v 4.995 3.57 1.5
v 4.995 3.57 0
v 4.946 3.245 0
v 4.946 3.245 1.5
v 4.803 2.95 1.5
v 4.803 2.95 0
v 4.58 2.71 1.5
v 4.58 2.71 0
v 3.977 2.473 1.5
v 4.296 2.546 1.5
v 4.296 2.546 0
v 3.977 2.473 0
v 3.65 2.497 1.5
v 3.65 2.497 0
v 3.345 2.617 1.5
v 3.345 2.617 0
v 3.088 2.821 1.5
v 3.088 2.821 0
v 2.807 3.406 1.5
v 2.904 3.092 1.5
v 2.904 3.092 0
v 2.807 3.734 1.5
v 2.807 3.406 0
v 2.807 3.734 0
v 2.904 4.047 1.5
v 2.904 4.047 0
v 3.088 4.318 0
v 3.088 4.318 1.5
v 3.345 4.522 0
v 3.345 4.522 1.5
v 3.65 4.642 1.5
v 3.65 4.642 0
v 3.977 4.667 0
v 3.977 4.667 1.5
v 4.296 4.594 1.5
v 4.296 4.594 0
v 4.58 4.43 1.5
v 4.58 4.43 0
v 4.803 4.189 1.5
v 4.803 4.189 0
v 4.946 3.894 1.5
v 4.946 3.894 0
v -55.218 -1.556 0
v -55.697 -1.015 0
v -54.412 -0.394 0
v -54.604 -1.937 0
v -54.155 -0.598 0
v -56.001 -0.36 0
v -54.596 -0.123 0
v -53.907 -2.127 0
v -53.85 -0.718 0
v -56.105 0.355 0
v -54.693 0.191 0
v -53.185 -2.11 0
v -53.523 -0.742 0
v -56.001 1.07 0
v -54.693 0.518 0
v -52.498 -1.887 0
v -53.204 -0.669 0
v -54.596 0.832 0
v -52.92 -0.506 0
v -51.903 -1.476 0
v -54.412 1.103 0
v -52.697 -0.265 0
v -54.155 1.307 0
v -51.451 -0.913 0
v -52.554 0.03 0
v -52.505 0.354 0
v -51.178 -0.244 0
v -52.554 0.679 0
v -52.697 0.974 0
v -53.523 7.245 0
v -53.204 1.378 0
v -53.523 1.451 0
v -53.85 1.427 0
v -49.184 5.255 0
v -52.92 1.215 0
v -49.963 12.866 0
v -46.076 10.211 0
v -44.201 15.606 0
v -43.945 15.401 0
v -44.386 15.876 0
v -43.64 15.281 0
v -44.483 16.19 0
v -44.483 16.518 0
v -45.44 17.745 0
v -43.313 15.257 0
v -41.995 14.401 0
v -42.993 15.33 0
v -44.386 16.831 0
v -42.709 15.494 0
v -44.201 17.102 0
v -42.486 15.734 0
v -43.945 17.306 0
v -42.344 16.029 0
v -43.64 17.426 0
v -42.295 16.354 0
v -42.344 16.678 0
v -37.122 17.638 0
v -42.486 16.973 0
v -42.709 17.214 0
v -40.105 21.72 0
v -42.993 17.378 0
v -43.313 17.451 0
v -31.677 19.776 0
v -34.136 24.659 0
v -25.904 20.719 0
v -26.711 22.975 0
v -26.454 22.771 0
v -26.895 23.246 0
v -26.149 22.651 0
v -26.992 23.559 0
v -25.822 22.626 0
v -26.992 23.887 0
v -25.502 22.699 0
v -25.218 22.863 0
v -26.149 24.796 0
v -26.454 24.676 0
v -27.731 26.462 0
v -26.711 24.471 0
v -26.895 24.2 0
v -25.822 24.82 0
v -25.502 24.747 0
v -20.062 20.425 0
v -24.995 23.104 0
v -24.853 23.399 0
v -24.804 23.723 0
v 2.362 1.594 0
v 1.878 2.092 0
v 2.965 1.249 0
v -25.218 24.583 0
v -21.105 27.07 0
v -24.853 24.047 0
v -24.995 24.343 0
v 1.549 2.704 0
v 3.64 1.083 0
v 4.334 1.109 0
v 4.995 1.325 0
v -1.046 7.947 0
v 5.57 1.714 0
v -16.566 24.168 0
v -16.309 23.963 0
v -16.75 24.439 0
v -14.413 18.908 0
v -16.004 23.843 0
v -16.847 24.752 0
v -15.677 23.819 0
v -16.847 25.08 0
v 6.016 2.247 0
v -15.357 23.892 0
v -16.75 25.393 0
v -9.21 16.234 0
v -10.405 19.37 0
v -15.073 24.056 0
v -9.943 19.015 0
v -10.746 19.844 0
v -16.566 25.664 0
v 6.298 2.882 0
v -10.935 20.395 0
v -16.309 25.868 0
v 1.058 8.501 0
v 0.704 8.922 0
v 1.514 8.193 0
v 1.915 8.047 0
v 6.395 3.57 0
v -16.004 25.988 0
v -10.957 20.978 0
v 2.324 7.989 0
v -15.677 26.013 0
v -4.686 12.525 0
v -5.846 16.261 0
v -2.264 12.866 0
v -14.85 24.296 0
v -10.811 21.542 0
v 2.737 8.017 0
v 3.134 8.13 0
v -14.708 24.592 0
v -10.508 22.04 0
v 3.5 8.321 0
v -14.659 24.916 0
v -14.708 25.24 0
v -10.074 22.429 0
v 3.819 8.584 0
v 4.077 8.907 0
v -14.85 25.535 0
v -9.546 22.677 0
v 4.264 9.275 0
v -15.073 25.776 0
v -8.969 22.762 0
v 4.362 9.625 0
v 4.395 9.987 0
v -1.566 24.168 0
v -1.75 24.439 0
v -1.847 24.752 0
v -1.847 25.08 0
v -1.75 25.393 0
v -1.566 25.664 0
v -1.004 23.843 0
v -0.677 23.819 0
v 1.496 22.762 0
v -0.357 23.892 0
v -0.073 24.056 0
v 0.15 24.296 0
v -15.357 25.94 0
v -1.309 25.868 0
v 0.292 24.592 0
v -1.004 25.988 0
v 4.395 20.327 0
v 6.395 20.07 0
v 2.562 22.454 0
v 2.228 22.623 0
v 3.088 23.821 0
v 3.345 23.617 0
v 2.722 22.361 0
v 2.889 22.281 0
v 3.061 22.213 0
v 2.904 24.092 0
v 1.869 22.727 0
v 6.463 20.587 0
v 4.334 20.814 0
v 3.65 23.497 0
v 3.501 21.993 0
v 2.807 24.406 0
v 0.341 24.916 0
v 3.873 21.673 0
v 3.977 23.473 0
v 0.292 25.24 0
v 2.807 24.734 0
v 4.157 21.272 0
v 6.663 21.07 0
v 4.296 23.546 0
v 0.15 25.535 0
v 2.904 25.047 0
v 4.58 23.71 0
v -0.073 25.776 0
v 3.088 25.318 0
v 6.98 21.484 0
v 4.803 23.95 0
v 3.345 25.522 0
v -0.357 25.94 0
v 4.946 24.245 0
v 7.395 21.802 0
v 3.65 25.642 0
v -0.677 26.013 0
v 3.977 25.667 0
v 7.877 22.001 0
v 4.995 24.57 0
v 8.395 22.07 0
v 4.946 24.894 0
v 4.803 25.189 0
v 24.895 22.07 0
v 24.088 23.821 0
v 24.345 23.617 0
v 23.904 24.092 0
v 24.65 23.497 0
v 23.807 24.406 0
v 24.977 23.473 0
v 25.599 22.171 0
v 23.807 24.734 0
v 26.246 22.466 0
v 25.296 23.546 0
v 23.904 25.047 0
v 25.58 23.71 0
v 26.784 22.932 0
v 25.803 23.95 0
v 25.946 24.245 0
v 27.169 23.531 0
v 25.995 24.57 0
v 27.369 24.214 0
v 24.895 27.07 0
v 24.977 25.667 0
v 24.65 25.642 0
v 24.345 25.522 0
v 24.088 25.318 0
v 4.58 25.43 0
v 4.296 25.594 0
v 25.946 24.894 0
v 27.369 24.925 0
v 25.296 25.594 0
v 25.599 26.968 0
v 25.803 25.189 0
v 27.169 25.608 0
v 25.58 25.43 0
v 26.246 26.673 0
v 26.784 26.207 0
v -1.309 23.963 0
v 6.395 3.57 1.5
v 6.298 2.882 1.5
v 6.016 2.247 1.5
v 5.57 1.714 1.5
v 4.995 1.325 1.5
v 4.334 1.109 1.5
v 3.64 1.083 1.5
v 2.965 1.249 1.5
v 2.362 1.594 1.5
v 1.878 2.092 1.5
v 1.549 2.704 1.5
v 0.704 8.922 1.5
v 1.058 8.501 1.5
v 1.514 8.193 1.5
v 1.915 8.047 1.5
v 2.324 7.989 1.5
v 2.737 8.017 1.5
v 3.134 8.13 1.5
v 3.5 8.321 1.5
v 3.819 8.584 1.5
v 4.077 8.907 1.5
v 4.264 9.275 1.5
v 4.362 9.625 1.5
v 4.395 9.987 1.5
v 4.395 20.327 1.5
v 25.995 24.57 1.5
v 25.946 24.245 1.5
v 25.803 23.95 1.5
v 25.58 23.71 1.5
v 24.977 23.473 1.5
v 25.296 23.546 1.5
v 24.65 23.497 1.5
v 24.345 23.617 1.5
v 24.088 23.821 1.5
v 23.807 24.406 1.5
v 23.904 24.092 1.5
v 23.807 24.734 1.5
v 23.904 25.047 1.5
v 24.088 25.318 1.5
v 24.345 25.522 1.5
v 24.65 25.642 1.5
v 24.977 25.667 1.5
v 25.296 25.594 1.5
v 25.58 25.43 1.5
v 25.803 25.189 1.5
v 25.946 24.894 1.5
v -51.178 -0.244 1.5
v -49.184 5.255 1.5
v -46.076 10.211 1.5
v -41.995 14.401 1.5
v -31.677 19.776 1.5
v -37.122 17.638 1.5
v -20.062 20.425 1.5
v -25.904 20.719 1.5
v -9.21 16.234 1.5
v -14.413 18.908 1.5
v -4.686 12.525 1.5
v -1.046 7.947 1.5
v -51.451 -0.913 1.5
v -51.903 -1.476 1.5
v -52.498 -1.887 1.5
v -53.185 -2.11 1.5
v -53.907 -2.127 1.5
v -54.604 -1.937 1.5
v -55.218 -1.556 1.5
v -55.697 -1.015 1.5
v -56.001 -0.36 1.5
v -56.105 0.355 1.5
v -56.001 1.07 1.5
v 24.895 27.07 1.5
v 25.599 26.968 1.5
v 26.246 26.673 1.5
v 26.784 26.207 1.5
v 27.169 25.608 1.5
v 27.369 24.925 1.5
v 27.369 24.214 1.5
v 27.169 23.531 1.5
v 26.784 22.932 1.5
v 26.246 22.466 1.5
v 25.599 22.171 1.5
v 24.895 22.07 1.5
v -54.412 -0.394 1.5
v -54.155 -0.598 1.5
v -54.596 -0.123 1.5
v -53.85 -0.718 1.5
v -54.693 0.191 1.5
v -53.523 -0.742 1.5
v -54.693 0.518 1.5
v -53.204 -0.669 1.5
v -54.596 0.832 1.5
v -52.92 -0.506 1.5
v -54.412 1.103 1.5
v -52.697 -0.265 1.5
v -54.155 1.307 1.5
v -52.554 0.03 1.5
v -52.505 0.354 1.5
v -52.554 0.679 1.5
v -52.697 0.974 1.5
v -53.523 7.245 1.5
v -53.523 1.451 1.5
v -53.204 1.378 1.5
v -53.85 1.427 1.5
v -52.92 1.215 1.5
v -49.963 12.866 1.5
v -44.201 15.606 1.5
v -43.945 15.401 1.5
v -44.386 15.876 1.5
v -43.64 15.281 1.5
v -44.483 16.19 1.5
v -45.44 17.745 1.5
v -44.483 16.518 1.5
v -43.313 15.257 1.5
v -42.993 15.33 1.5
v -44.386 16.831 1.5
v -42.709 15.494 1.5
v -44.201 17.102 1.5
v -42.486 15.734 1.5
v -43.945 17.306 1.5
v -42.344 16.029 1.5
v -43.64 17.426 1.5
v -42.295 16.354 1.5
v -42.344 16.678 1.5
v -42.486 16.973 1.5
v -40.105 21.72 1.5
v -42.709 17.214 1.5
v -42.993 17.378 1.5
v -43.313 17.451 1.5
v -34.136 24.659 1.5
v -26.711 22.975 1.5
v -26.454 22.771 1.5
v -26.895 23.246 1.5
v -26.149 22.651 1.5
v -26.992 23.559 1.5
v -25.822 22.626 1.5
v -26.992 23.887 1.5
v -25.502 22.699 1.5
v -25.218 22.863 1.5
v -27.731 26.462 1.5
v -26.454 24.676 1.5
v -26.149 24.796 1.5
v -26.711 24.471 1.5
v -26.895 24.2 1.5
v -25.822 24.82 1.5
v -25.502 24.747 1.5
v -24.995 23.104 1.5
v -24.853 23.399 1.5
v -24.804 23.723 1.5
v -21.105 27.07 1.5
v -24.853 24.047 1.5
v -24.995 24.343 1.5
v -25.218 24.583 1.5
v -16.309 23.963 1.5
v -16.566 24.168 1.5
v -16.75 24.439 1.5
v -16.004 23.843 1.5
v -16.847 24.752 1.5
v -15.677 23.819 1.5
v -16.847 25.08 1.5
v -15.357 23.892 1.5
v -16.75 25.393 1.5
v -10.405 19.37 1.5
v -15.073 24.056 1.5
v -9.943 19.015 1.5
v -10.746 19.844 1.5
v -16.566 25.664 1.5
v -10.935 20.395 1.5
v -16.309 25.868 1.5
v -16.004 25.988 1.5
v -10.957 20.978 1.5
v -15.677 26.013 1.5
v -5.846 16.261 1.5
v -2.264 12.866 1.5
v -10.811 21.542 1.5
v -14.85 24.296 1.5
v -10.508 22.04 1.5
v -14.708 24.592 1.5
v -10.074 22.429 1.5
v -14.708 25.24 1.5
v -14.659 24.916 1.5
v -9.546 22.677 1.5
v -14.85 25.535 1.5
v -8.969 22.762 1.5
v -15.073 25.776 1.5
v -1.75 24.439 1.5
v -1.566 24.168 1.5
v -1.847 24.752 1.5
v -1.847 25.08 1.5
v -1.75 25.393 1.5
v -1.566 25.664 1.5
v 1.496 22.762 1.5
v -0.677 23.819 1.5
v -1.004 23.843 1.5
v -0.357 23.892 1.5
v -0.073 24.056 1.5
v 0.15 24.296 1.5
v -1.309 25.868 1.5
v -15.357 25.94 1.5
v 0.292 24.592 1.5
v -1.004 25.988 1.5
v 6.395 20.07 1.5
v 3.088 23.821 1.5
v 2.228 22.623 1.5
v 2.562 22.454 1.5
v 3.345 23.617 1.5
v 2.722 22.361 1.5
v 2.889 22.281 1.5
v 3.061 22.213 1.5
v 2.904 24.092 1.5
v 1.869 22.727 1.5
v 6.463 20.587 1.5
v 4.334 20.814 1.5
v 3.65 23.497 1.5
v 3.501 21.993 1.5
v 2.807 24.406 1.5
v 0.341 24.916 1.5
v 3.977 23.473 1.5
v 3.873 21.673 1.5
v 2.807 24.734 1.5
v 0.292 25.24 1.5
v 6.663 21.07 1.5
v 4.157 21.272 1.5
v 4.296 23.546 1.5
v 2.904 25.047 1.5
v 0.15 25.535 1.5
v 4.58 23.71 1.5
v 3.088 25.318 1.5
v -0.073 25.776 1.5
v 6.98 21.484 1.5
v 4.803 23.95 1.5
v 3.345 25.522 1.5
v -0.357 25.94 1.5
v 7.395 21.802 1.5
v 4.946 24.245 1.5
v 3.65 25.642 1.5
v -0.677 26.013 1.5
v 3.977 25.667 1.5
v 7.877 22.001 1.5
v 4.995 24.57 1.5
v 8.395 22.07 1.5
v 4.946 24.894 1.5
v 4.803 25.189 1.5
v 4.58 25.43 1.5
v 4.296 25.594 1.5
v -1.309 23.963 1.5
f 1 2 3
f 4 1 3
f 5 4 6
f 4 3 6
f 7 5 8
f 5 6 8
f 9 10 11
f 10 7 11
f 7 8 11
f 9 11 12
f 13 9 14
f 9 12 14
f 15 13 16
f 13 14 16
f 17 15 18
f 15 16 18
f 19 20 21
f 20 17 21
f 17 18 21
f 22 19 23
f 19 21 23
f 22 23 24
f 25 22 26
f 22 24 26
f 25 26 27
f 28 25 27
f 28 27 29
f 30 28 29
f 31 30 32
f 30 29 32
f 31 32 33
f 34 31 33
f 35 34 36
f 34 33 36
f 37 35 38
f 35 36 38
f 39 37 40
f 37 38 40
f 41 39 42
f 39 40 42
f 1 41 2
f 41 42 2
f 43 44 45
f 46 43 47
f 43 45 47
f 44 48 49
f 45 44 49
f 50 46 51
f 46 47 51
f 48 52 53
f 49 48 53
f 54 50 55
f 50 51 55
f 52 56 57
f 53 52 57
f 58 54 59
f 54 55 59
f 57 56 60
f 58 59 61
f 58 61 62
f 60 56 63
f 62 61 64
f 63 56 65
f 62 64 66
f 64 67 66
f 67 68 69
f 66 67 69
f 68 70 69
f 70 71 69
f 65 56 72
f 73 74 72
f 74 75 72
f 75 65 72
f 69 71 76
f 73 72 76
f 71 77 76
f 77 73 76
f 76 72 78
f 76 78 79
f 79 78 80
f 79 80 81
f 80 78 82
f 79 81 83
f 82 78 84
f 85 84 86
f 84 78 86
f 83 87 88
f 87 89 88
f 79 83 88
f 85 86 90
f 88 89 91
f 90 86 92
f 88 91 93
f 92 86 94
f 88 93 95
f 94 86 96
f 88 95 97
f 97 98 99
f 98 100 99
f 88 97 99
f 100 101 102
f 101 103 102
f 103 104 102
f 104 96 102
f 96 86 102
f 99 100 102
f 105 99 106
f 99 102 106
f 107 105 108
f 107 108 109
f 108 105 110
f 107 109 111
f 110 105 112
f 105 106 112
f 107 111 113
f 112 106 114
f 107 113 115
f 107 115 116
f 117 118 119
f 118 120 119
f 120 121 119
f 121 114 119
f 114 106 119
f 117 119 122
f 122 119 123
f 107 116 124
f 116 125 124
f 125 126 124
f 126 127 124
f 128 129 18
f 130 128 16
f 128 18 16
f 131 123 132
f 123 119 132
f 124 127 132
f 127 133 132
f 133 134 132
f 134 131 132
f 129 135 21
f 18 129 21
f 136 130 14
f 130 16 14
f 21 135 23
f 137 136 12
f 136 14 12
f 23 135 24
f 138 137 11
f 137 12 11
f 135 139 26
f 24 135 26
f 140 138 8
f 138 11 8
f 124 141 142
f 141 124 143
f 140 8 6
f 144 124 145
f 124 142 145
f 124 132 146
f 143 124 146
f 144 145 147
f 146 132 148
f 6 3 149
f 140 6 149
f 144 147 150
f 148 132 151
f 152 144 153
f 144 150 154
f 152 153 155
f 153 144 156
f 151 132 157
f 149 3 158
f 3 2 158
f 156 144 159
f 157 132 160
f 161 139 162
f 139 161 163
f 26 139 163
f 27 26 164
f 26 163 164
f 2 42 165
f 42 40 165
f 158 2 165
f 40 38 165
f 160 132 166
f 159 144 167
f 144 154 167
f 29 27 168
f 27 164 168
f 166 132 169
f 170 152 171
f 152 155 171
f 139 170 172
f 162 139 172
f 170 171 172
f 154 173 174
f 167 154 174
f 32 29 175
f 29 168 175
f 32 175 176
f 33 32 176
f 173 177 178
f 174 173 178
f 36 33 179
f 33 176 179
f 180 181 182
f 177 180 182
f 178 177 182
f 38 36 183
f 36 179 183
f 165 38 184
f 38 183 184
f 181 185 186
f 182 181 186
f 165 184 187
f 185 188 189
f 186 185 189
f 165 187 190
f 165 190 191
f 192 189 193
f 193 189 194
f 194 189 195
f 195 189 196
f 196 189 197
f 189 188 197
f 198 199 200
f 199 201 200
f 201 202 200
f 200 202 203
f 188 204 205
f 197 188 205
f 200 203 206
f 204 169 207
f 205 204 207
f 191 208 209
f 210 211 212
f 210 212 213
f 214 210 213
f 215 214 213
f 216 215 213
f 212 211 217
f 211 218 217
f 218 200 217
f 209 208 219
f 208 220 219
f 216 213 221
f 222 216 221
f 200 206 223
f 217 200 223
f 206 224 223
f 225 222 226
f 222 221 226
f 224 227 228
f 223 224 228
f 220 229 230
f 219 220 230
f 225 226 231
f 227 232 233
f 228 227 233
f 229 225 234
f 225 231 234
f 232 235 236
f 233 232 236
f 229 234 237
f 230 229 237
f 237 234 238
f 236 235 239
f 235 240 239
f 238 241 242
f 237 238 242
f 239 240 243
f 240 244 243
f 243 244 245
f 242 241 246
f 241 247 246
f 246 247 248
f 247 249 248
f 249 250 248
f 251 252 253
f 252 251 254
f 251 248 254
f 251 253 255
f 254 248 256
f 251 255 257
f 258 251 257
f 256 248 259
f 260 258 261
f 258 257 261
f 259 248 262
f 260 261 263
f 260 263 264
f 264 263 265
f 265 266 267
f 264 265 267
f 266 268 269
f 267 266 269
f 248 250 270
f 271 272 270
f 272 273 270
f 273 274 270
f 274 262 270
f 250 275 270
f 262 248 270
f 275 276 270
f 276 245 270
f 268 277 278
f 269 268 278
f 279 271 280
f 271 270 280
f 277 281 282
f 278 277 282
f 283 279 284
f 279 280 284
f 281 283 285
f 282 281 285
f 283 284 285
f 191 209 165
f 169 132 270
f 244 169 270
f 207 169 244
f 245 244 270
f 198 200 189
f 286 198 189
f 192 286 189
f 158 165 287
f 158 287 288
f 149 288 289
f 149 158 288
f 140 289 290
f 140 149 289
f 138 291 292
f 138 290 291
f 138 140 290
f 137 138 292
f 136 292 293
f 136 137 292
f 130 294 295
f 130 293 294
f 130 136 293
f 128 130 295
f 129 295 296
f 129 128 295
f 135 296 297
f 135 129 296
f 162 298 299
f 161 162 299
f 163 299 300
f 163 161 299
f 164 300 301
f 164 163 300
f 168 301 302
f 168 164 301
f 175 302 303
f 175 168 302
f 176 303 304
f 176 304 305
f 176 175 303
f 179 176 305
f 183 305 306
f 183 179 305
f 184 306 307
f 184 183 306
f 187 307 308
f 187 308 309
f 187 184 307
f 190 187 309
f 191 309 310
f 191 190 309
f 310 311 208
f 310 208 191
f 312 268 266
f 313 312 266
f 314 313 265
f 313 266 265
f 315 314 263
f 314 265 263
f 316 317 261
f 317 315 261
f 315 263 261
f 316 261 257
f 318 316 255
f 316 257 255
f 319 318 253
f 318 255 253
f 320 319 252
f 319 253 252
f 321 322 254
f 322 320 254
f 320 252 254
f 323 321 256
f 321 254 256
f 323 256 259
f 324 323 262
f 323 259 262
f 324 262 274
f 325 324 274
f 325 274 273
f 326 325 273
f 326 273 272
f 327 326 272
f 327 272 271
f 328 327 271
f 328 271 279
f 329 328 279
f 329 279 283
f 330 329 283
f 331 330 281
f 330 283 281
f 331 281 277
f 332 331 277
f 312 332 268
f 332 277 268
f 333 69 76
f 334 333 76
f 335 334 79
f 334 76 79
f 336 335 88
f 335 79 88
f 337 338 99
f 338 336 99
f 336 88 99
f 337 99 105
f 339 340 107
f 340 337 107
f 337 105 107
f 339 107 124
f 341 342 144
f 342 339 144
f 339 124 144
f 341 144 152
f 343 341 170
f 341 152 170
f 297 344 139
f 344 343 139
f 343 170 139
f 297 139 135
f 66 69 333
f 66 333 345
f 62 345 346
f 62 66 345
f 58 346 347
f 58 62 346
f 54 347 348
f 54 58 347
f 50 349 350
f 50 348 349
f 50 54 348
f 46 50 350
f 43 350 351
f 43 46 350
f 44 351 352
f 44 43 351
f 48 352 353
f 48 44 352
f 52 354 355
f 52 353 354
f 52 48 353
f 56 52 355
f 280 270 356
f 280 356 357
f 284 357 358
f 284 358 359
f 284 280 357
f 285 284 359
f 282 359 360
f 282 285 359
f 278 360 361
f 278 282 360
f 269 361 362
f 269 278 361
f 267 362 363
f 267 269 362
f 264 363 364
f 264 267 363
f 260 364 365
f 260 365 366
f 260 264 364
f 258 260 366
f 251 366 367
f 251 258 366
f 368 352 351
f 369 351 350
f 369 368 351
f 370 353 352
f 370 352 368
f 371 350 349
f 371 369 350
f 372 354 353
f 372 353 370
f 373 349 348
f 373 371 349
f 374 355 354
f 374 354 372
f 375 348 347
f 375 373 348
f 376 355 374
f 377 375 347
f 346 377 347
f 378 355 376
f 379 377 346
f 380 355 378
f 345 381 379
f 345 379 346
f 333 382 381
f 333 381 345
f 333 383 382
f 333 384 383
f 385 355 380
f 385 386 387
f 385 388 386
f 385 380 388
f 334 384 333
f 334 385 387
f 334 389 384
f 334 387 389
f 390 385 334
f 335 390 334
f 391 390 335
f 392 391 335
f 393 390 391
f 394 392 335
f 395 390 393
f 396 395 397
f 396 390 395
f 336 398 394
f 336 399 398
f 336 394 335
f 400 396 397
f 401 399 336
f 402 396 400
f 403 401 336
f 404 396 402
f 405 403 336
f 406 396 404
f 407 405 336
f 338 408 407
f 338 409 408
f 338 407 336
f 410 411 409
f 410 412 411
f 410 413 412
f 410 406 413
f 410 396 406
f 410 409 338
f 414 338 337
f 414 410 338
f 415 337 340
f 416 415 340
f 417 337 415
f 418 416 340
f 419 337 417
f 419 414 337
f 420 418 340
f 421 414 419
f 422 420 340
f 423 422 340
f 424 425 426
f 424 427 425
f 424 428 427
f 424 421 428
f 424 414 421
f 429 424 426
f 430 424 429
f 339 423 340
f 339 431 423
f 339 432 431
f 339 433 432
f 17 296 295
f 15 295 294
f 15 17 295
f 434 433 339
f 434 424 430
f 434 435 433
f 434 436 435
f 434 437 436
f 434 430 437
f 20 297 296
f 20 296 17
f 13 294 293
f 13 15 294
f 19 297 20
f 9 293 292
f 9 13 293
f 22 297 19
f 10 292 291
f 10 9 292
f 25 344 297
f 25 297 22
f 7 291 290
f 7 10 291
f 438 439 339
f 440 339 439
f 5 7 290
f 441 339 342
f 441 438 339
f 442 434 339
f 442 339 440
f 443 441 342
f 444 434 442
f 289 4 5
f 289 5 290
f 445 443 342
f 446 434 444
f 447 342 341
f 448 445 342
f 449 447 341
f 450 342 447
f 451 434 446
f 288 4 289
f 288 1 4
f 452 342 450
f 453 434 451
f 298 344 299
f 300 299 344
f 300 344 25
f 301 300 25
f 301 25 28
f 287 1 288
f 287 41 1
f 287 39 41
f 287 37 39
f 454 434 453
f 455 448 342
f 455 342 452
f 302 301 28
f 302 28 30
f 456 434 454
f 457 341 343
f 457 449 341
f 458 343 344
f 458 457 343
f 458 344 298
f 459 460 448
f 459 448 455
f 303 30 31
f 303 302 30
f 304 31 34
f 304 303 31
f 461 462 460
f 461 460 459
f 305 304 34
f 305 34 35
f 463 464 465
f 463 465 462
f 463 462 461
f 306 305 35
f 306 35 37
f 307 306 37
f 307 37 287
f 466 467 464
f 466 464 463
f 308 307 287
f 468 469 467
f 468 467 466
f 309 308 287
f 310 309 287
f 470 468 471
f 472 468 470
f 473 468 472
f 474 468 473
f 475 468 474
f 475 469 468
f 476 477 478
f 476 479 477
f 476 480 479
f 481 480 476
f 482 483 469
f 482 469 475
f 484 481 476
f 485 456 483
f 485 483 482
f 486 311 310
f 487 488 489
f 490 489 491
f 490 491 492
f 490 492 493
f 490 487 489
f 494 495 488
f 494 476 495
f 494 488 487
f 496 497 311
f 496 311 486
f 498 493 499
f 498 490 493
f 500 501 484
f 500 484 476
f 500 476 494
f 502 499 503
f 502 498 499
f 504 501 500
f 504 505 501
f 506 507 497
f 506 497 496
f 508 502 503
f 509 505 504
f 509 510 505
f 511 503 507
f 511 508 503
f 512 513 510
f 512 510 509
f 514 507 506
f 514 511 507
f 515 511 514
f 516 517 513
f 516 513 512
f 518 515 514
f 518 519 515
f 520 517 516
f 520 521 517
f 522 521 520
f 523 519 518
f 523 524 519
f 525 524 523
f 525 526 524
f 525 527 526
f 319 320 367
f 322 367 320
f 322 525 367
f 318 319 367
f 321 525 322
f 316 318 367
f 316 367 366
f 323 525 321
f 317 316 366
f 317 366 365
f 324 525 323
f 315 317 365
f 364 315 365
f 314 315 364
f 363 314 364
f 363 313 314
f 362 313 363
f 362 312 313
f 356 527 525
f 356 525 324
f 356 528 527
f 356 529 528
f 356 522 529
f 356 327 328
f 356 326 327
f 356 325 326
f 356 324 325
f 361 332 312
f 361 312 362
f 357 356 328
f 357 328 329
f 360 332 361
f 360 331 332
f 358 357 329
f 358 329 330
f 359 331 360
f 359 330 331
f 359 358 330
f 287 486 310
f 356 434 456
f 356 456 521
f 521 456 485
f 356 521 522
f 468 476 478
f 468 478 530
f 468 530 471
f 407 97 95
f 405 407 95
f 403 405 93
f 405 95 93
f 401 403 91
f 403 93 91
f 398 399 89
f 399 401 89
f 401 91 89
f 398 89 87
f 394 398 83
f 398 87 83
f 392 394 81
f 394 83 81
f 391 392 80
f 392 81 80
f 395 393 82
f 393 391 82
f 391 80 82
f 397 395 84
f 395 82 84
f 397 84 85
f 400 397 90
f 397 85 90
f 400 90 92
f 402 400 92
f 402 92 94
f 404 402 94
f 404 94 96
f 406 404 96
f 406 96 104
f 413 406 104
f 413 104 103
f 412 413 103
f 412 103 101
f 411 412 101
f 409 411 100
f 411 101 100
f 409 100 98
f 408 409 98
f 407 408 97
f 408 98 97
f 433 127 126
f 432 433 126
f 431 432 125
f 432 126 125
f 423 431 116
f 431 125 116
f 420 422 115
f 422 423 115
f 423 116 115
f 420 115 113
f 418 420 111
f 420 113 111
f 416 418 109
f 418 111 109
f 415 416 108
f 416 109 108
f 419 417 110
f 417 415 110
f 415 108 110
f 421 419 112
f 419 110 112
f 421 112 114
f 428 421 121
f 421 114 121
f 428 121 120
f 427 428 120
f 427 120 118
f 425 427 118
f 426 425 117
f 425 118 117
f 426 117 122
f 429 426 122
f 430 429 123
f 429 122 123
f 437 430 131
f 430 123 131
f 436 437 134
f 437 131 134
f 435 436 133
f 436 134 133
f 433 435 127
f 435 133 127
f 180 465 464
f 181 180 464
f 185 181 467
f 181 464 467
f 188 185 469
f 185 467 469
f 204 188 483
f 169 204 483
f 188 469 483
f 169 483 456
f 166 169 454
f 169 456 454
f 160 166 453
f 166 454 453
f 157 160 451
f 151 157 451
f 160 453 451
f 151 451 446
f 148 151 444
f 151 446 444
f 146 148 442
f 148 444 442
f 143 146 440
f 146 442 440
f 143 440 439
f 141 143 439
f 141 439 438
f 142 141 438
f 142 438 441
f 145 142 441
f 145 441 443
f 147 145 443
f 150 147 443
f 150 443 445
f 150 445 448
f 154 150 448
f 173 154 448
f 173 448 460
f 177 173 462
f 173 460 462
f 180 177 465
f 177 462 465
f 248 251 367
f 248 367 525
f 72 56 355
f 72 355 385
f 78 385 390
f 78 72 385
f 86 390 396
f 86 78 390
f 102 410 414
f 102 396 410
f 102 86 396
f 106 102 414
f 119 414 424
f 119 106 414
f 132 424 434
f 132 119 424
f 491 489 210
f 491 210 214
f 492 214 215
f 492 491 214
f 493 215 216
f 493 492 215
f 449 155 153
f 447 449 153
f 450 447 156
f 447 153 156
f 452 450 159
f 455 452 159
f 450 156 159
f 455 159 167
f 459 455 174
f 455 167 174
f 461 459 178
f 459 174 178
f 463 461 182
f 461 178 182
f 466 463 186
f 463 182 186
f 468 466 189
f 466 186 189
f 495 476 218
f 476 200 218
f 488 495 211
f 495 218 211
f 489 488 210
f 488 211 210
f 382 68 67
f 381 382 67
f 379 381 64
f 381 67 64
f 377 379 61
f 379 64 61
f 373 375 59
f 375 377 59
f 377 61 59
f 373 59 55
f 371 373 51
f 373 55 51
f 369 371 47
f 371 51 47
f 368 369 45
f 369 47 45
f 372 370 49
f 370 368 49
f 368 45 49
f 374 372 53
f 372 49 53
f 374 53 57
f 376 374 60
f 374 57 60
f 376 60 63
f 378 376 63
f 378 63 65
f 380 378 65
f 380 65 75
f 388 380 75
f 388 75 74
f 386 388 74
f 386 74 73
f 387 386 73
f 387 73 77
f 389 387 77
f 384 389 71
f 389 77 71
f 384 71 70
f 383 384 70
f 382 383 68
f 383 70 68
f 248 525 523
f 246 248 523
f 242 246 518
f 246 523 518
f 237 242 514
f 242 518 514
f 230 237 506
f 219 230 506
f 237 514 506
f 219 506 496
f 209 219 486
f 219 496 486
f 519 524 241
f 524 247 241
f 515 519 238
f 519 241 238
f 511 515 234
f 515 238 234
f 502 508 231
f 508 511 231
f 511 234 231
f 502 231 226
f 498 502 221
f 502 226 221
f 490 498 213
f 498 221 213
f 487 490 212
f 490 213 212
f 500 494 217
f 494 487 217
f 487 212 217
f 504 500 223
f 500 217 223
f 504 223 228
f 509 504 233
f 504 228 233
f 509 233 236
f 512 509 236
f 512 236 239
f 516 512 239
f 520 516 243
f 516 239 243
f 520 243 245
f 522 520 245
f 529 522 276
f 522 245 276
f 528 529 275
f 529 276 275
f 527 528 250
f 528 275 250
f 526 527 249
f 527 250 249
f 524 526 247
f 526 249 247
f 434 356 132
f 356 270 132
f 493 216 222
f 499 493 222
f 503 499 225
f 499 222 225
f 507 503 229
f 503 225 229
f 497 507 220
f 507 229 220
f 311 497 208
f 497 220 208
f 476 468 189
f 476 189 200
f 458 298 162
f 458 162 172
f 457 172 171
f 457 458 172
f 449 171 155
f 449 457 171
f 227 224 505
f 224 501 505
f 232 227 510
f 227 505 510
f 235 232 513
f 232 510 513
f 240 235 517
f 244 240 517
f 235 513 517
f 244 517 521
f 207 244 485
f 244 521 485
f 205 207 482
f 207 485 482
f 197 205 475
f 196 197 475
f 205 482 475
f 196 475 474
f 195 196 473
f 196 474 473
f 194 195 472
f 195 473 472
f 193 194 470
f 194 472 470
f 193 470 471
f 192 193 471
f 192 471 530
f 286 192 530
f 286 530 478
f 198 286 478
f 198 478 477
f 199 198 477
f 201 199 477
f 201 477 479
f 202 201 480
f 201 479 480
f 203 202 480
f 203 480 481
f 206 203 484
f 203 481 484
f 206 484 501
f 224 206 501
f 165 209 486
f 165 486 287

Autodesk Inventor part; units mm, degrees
ref_plane "YZ Plane" through (0, 0, 0) normal (1, 0, 0) x (0, 1, 0)
ref_plane "XZ Plane" through (0, 0, 0) normal (0, 1, 0) x (-1, 0, 0)
ref_plane "XY Plane" through (0, 0, 0) normal (0, 0, 1) x (1, 0, 0)
sketch "スケッチ2" plane through (0, 0, 0) normal (0, 0, 1) x (1, 0, 0)
  circle A0 centre (24.8946, 24.5696) radius 0.85 projected
  circle A1 centre (3.8946, 24.5696) radius 0.85 projected
  circle A2 centre (3.8946, 3.5696) radius 0.85 projected
  circle A3 centre (24.8946, 24.5696) radius 2.5
  circle A4 centre (24.8946, 24.5696) radius 1.1
  circle A5 centre (3.8946, 24.5696) radius 1.1
  circle A6 centre (3.8946, 24.5696) radius 2.5
  circle A7 centre (3.8946, 3.5696) radius 2.5
  circle A8 centre (3.8946, 3.5696) radius 1.1
  line L0 (24.8946, 27.0696) -> (3.8946, 27.0696)
  line L1 (24.8946, 22.0696) -> (3.8946, 22.0696)
  line L2 (6.3946, 24.5696) -> (6.3946, 3.5696)
  line L3 (3.8946, 27.0696) -> (-21.1054, 27.0696)
  arc A9 (-21.1054, 27.0696) -> (-56.0009, 1.0696) centre (-21.1054, -9.3477) ccw
  line L4 (3.8946, 1.0696) -> (-56.0009, 1.0696) construction
  circle A10 centre (-53.6054, 0.3545) radius 2.5
  arc A11 (1.5492, 2.7041) -> (-51.1781, -0.2441) centre (-24.3623, -6.8571) ccw
  circle A12 centre (-25.9042, 23.7232) radius 3 construction
  circle A13 centre (-53.6054, 0.3545) radius 1.1
  circle A14 centre (-25.9042, 23.7232) radius 1.1
  circle A15 centre (-43.3948, 16.3537) radius 2.3971 construction
  line L5 (-43.3948, 16.3537) -> (-25.9042, 23.7232) construction
  line L6 (-43.3948, 16.3537) -> (-53.6054, 0.3545) construction
  circle A16 centre (-43.3948, 16.3537) radius 1.1
  point P0 (0, 0)
  point P1 (3.8946, 1.0696)
  point P2 (1.4587, 3.0071)
  point P3 (-51.2099, 1.0696)
  point P4 (-55.9852, 1.6541)
  point P5 (6.3946, 22.0696)
  point P6 (-25.9042, 20.719)
  dimension "d10" = 5
  dimension "d11" = 2.2
  dimension "d12" = 2.2
  dimension "d13" = 5
  dimension "d14" = 5
  dimension "d15" = 2.2
  dimension "d16" = 25
  dimension "d17" = 5
  dimension "d21" = 60
  dimension "d23" = 6
  dimension "d24" = 2.2
  dimension "d25" = 2.2
  dimension "d26" = 2.2
extrude "押し出し1" add sketch "スケッチ2" along normal blind 1.5 contours A3 | A3 L1 L2 A6 L0 | A6 | A6 L1 L2 A7 A11 A10 A9 L3 | L1 A6 L2 | A7 | A10
fillet "フィレット1" radius 2 1 edges at (6.3946, 22.0696, 0.75)
sketch "スケッチ3" plane through (0, 0, 1.5) normal (0, 0, 1) x (1, 0, 0)
  line L0 (-24.3623, 22.7621) -> (4.3946, 22.7621)
  line L1 (4.3946, 22.7621) -> (4.3946, 6.0191)
  line L2 (6.3946, 3.5696) -> (6.3946, 20.0696) projected
  line L3 (24.8946, 27.0696) -> (-21.1054, 27.0696) projected
  circle A0 centre (3.8946, 24.5696) radius 1.1 projected
  circle A1 centre (3.8946, 24.5696) radius 2.5
  arc A2 (1.5492, 2.7041) -> (-51.1781, -0.2441) centre (-24.3623, -6.8571) ccw projected
  arc A3 (1.5492, 2.7041) -> (6.3946, 3.5696) centre (3.8946, 3.5696) ccw projected
  circle A4 centre (3.8946, 3.5696) radius 2.5
  arc A5 (3.4255, 3.3965) -> (-53.12, 0.2347) centre (-24.3623, -6.8571) ccw
  arc A6 (3.4255, 3.3965) -> (4.3946, 3.5696) centre (3.8946, 3.5696) ccw
  line L4 (4.3946, 3.5696) -> (4.3946, 20.0696)
  point P0 (0, 0)
  point P1 (2.4919, 5.639)
  point P2 (4.3946, 22.1201)
  point P3 (2.1675, 22.7621)
  dimension "d27" = 2
  dimension "d30" = 2
extrude "押し出し2" cut sketch "スケッチ3" against normal through all contours L0 A1 L1 A4 A5
fillet "フィレット2" radius 2 5 edges at (-24.3623, 22.7621, 0.75) (2.4919, 5.639, 0.75) (4.3946, 6.0191, 0.75) (4.3946, 22.1201, 0.75) (2.1675, 22.7621, 0.75)
sketch "スケッチ4" plane through (0, 0, 1.5) normal (0, 0, 1) x (1, 0, 0)
  circle A0 centre (-15.7592, 24.9158) radius 1.1
  circle A1 centre (-0.7592, 24.9158) radius 1.1
  circle A2 centre (-0.7592, 24.9158) radius 2.1538
  line L0 (24.8946, 27.0696) -> (-21.1054, 27.0696) projected
  line L1 (-8.969, 22.7621) -> (1.4961, 22.7621) projected
  line L2 (1.3946, 24.5696) -> (1.3946, 3.5696) projected
  point P0 (0, 0)
  dimension "d34" = 2.2
  dimension "d35" = 2.2
  dimension "d36" = 15
extrude "押し出し3" cut sketch "スケッチ4" against normal through all contours A0 | A1
properties part number "tesaki" material "アルミニウム 2014-T4"
